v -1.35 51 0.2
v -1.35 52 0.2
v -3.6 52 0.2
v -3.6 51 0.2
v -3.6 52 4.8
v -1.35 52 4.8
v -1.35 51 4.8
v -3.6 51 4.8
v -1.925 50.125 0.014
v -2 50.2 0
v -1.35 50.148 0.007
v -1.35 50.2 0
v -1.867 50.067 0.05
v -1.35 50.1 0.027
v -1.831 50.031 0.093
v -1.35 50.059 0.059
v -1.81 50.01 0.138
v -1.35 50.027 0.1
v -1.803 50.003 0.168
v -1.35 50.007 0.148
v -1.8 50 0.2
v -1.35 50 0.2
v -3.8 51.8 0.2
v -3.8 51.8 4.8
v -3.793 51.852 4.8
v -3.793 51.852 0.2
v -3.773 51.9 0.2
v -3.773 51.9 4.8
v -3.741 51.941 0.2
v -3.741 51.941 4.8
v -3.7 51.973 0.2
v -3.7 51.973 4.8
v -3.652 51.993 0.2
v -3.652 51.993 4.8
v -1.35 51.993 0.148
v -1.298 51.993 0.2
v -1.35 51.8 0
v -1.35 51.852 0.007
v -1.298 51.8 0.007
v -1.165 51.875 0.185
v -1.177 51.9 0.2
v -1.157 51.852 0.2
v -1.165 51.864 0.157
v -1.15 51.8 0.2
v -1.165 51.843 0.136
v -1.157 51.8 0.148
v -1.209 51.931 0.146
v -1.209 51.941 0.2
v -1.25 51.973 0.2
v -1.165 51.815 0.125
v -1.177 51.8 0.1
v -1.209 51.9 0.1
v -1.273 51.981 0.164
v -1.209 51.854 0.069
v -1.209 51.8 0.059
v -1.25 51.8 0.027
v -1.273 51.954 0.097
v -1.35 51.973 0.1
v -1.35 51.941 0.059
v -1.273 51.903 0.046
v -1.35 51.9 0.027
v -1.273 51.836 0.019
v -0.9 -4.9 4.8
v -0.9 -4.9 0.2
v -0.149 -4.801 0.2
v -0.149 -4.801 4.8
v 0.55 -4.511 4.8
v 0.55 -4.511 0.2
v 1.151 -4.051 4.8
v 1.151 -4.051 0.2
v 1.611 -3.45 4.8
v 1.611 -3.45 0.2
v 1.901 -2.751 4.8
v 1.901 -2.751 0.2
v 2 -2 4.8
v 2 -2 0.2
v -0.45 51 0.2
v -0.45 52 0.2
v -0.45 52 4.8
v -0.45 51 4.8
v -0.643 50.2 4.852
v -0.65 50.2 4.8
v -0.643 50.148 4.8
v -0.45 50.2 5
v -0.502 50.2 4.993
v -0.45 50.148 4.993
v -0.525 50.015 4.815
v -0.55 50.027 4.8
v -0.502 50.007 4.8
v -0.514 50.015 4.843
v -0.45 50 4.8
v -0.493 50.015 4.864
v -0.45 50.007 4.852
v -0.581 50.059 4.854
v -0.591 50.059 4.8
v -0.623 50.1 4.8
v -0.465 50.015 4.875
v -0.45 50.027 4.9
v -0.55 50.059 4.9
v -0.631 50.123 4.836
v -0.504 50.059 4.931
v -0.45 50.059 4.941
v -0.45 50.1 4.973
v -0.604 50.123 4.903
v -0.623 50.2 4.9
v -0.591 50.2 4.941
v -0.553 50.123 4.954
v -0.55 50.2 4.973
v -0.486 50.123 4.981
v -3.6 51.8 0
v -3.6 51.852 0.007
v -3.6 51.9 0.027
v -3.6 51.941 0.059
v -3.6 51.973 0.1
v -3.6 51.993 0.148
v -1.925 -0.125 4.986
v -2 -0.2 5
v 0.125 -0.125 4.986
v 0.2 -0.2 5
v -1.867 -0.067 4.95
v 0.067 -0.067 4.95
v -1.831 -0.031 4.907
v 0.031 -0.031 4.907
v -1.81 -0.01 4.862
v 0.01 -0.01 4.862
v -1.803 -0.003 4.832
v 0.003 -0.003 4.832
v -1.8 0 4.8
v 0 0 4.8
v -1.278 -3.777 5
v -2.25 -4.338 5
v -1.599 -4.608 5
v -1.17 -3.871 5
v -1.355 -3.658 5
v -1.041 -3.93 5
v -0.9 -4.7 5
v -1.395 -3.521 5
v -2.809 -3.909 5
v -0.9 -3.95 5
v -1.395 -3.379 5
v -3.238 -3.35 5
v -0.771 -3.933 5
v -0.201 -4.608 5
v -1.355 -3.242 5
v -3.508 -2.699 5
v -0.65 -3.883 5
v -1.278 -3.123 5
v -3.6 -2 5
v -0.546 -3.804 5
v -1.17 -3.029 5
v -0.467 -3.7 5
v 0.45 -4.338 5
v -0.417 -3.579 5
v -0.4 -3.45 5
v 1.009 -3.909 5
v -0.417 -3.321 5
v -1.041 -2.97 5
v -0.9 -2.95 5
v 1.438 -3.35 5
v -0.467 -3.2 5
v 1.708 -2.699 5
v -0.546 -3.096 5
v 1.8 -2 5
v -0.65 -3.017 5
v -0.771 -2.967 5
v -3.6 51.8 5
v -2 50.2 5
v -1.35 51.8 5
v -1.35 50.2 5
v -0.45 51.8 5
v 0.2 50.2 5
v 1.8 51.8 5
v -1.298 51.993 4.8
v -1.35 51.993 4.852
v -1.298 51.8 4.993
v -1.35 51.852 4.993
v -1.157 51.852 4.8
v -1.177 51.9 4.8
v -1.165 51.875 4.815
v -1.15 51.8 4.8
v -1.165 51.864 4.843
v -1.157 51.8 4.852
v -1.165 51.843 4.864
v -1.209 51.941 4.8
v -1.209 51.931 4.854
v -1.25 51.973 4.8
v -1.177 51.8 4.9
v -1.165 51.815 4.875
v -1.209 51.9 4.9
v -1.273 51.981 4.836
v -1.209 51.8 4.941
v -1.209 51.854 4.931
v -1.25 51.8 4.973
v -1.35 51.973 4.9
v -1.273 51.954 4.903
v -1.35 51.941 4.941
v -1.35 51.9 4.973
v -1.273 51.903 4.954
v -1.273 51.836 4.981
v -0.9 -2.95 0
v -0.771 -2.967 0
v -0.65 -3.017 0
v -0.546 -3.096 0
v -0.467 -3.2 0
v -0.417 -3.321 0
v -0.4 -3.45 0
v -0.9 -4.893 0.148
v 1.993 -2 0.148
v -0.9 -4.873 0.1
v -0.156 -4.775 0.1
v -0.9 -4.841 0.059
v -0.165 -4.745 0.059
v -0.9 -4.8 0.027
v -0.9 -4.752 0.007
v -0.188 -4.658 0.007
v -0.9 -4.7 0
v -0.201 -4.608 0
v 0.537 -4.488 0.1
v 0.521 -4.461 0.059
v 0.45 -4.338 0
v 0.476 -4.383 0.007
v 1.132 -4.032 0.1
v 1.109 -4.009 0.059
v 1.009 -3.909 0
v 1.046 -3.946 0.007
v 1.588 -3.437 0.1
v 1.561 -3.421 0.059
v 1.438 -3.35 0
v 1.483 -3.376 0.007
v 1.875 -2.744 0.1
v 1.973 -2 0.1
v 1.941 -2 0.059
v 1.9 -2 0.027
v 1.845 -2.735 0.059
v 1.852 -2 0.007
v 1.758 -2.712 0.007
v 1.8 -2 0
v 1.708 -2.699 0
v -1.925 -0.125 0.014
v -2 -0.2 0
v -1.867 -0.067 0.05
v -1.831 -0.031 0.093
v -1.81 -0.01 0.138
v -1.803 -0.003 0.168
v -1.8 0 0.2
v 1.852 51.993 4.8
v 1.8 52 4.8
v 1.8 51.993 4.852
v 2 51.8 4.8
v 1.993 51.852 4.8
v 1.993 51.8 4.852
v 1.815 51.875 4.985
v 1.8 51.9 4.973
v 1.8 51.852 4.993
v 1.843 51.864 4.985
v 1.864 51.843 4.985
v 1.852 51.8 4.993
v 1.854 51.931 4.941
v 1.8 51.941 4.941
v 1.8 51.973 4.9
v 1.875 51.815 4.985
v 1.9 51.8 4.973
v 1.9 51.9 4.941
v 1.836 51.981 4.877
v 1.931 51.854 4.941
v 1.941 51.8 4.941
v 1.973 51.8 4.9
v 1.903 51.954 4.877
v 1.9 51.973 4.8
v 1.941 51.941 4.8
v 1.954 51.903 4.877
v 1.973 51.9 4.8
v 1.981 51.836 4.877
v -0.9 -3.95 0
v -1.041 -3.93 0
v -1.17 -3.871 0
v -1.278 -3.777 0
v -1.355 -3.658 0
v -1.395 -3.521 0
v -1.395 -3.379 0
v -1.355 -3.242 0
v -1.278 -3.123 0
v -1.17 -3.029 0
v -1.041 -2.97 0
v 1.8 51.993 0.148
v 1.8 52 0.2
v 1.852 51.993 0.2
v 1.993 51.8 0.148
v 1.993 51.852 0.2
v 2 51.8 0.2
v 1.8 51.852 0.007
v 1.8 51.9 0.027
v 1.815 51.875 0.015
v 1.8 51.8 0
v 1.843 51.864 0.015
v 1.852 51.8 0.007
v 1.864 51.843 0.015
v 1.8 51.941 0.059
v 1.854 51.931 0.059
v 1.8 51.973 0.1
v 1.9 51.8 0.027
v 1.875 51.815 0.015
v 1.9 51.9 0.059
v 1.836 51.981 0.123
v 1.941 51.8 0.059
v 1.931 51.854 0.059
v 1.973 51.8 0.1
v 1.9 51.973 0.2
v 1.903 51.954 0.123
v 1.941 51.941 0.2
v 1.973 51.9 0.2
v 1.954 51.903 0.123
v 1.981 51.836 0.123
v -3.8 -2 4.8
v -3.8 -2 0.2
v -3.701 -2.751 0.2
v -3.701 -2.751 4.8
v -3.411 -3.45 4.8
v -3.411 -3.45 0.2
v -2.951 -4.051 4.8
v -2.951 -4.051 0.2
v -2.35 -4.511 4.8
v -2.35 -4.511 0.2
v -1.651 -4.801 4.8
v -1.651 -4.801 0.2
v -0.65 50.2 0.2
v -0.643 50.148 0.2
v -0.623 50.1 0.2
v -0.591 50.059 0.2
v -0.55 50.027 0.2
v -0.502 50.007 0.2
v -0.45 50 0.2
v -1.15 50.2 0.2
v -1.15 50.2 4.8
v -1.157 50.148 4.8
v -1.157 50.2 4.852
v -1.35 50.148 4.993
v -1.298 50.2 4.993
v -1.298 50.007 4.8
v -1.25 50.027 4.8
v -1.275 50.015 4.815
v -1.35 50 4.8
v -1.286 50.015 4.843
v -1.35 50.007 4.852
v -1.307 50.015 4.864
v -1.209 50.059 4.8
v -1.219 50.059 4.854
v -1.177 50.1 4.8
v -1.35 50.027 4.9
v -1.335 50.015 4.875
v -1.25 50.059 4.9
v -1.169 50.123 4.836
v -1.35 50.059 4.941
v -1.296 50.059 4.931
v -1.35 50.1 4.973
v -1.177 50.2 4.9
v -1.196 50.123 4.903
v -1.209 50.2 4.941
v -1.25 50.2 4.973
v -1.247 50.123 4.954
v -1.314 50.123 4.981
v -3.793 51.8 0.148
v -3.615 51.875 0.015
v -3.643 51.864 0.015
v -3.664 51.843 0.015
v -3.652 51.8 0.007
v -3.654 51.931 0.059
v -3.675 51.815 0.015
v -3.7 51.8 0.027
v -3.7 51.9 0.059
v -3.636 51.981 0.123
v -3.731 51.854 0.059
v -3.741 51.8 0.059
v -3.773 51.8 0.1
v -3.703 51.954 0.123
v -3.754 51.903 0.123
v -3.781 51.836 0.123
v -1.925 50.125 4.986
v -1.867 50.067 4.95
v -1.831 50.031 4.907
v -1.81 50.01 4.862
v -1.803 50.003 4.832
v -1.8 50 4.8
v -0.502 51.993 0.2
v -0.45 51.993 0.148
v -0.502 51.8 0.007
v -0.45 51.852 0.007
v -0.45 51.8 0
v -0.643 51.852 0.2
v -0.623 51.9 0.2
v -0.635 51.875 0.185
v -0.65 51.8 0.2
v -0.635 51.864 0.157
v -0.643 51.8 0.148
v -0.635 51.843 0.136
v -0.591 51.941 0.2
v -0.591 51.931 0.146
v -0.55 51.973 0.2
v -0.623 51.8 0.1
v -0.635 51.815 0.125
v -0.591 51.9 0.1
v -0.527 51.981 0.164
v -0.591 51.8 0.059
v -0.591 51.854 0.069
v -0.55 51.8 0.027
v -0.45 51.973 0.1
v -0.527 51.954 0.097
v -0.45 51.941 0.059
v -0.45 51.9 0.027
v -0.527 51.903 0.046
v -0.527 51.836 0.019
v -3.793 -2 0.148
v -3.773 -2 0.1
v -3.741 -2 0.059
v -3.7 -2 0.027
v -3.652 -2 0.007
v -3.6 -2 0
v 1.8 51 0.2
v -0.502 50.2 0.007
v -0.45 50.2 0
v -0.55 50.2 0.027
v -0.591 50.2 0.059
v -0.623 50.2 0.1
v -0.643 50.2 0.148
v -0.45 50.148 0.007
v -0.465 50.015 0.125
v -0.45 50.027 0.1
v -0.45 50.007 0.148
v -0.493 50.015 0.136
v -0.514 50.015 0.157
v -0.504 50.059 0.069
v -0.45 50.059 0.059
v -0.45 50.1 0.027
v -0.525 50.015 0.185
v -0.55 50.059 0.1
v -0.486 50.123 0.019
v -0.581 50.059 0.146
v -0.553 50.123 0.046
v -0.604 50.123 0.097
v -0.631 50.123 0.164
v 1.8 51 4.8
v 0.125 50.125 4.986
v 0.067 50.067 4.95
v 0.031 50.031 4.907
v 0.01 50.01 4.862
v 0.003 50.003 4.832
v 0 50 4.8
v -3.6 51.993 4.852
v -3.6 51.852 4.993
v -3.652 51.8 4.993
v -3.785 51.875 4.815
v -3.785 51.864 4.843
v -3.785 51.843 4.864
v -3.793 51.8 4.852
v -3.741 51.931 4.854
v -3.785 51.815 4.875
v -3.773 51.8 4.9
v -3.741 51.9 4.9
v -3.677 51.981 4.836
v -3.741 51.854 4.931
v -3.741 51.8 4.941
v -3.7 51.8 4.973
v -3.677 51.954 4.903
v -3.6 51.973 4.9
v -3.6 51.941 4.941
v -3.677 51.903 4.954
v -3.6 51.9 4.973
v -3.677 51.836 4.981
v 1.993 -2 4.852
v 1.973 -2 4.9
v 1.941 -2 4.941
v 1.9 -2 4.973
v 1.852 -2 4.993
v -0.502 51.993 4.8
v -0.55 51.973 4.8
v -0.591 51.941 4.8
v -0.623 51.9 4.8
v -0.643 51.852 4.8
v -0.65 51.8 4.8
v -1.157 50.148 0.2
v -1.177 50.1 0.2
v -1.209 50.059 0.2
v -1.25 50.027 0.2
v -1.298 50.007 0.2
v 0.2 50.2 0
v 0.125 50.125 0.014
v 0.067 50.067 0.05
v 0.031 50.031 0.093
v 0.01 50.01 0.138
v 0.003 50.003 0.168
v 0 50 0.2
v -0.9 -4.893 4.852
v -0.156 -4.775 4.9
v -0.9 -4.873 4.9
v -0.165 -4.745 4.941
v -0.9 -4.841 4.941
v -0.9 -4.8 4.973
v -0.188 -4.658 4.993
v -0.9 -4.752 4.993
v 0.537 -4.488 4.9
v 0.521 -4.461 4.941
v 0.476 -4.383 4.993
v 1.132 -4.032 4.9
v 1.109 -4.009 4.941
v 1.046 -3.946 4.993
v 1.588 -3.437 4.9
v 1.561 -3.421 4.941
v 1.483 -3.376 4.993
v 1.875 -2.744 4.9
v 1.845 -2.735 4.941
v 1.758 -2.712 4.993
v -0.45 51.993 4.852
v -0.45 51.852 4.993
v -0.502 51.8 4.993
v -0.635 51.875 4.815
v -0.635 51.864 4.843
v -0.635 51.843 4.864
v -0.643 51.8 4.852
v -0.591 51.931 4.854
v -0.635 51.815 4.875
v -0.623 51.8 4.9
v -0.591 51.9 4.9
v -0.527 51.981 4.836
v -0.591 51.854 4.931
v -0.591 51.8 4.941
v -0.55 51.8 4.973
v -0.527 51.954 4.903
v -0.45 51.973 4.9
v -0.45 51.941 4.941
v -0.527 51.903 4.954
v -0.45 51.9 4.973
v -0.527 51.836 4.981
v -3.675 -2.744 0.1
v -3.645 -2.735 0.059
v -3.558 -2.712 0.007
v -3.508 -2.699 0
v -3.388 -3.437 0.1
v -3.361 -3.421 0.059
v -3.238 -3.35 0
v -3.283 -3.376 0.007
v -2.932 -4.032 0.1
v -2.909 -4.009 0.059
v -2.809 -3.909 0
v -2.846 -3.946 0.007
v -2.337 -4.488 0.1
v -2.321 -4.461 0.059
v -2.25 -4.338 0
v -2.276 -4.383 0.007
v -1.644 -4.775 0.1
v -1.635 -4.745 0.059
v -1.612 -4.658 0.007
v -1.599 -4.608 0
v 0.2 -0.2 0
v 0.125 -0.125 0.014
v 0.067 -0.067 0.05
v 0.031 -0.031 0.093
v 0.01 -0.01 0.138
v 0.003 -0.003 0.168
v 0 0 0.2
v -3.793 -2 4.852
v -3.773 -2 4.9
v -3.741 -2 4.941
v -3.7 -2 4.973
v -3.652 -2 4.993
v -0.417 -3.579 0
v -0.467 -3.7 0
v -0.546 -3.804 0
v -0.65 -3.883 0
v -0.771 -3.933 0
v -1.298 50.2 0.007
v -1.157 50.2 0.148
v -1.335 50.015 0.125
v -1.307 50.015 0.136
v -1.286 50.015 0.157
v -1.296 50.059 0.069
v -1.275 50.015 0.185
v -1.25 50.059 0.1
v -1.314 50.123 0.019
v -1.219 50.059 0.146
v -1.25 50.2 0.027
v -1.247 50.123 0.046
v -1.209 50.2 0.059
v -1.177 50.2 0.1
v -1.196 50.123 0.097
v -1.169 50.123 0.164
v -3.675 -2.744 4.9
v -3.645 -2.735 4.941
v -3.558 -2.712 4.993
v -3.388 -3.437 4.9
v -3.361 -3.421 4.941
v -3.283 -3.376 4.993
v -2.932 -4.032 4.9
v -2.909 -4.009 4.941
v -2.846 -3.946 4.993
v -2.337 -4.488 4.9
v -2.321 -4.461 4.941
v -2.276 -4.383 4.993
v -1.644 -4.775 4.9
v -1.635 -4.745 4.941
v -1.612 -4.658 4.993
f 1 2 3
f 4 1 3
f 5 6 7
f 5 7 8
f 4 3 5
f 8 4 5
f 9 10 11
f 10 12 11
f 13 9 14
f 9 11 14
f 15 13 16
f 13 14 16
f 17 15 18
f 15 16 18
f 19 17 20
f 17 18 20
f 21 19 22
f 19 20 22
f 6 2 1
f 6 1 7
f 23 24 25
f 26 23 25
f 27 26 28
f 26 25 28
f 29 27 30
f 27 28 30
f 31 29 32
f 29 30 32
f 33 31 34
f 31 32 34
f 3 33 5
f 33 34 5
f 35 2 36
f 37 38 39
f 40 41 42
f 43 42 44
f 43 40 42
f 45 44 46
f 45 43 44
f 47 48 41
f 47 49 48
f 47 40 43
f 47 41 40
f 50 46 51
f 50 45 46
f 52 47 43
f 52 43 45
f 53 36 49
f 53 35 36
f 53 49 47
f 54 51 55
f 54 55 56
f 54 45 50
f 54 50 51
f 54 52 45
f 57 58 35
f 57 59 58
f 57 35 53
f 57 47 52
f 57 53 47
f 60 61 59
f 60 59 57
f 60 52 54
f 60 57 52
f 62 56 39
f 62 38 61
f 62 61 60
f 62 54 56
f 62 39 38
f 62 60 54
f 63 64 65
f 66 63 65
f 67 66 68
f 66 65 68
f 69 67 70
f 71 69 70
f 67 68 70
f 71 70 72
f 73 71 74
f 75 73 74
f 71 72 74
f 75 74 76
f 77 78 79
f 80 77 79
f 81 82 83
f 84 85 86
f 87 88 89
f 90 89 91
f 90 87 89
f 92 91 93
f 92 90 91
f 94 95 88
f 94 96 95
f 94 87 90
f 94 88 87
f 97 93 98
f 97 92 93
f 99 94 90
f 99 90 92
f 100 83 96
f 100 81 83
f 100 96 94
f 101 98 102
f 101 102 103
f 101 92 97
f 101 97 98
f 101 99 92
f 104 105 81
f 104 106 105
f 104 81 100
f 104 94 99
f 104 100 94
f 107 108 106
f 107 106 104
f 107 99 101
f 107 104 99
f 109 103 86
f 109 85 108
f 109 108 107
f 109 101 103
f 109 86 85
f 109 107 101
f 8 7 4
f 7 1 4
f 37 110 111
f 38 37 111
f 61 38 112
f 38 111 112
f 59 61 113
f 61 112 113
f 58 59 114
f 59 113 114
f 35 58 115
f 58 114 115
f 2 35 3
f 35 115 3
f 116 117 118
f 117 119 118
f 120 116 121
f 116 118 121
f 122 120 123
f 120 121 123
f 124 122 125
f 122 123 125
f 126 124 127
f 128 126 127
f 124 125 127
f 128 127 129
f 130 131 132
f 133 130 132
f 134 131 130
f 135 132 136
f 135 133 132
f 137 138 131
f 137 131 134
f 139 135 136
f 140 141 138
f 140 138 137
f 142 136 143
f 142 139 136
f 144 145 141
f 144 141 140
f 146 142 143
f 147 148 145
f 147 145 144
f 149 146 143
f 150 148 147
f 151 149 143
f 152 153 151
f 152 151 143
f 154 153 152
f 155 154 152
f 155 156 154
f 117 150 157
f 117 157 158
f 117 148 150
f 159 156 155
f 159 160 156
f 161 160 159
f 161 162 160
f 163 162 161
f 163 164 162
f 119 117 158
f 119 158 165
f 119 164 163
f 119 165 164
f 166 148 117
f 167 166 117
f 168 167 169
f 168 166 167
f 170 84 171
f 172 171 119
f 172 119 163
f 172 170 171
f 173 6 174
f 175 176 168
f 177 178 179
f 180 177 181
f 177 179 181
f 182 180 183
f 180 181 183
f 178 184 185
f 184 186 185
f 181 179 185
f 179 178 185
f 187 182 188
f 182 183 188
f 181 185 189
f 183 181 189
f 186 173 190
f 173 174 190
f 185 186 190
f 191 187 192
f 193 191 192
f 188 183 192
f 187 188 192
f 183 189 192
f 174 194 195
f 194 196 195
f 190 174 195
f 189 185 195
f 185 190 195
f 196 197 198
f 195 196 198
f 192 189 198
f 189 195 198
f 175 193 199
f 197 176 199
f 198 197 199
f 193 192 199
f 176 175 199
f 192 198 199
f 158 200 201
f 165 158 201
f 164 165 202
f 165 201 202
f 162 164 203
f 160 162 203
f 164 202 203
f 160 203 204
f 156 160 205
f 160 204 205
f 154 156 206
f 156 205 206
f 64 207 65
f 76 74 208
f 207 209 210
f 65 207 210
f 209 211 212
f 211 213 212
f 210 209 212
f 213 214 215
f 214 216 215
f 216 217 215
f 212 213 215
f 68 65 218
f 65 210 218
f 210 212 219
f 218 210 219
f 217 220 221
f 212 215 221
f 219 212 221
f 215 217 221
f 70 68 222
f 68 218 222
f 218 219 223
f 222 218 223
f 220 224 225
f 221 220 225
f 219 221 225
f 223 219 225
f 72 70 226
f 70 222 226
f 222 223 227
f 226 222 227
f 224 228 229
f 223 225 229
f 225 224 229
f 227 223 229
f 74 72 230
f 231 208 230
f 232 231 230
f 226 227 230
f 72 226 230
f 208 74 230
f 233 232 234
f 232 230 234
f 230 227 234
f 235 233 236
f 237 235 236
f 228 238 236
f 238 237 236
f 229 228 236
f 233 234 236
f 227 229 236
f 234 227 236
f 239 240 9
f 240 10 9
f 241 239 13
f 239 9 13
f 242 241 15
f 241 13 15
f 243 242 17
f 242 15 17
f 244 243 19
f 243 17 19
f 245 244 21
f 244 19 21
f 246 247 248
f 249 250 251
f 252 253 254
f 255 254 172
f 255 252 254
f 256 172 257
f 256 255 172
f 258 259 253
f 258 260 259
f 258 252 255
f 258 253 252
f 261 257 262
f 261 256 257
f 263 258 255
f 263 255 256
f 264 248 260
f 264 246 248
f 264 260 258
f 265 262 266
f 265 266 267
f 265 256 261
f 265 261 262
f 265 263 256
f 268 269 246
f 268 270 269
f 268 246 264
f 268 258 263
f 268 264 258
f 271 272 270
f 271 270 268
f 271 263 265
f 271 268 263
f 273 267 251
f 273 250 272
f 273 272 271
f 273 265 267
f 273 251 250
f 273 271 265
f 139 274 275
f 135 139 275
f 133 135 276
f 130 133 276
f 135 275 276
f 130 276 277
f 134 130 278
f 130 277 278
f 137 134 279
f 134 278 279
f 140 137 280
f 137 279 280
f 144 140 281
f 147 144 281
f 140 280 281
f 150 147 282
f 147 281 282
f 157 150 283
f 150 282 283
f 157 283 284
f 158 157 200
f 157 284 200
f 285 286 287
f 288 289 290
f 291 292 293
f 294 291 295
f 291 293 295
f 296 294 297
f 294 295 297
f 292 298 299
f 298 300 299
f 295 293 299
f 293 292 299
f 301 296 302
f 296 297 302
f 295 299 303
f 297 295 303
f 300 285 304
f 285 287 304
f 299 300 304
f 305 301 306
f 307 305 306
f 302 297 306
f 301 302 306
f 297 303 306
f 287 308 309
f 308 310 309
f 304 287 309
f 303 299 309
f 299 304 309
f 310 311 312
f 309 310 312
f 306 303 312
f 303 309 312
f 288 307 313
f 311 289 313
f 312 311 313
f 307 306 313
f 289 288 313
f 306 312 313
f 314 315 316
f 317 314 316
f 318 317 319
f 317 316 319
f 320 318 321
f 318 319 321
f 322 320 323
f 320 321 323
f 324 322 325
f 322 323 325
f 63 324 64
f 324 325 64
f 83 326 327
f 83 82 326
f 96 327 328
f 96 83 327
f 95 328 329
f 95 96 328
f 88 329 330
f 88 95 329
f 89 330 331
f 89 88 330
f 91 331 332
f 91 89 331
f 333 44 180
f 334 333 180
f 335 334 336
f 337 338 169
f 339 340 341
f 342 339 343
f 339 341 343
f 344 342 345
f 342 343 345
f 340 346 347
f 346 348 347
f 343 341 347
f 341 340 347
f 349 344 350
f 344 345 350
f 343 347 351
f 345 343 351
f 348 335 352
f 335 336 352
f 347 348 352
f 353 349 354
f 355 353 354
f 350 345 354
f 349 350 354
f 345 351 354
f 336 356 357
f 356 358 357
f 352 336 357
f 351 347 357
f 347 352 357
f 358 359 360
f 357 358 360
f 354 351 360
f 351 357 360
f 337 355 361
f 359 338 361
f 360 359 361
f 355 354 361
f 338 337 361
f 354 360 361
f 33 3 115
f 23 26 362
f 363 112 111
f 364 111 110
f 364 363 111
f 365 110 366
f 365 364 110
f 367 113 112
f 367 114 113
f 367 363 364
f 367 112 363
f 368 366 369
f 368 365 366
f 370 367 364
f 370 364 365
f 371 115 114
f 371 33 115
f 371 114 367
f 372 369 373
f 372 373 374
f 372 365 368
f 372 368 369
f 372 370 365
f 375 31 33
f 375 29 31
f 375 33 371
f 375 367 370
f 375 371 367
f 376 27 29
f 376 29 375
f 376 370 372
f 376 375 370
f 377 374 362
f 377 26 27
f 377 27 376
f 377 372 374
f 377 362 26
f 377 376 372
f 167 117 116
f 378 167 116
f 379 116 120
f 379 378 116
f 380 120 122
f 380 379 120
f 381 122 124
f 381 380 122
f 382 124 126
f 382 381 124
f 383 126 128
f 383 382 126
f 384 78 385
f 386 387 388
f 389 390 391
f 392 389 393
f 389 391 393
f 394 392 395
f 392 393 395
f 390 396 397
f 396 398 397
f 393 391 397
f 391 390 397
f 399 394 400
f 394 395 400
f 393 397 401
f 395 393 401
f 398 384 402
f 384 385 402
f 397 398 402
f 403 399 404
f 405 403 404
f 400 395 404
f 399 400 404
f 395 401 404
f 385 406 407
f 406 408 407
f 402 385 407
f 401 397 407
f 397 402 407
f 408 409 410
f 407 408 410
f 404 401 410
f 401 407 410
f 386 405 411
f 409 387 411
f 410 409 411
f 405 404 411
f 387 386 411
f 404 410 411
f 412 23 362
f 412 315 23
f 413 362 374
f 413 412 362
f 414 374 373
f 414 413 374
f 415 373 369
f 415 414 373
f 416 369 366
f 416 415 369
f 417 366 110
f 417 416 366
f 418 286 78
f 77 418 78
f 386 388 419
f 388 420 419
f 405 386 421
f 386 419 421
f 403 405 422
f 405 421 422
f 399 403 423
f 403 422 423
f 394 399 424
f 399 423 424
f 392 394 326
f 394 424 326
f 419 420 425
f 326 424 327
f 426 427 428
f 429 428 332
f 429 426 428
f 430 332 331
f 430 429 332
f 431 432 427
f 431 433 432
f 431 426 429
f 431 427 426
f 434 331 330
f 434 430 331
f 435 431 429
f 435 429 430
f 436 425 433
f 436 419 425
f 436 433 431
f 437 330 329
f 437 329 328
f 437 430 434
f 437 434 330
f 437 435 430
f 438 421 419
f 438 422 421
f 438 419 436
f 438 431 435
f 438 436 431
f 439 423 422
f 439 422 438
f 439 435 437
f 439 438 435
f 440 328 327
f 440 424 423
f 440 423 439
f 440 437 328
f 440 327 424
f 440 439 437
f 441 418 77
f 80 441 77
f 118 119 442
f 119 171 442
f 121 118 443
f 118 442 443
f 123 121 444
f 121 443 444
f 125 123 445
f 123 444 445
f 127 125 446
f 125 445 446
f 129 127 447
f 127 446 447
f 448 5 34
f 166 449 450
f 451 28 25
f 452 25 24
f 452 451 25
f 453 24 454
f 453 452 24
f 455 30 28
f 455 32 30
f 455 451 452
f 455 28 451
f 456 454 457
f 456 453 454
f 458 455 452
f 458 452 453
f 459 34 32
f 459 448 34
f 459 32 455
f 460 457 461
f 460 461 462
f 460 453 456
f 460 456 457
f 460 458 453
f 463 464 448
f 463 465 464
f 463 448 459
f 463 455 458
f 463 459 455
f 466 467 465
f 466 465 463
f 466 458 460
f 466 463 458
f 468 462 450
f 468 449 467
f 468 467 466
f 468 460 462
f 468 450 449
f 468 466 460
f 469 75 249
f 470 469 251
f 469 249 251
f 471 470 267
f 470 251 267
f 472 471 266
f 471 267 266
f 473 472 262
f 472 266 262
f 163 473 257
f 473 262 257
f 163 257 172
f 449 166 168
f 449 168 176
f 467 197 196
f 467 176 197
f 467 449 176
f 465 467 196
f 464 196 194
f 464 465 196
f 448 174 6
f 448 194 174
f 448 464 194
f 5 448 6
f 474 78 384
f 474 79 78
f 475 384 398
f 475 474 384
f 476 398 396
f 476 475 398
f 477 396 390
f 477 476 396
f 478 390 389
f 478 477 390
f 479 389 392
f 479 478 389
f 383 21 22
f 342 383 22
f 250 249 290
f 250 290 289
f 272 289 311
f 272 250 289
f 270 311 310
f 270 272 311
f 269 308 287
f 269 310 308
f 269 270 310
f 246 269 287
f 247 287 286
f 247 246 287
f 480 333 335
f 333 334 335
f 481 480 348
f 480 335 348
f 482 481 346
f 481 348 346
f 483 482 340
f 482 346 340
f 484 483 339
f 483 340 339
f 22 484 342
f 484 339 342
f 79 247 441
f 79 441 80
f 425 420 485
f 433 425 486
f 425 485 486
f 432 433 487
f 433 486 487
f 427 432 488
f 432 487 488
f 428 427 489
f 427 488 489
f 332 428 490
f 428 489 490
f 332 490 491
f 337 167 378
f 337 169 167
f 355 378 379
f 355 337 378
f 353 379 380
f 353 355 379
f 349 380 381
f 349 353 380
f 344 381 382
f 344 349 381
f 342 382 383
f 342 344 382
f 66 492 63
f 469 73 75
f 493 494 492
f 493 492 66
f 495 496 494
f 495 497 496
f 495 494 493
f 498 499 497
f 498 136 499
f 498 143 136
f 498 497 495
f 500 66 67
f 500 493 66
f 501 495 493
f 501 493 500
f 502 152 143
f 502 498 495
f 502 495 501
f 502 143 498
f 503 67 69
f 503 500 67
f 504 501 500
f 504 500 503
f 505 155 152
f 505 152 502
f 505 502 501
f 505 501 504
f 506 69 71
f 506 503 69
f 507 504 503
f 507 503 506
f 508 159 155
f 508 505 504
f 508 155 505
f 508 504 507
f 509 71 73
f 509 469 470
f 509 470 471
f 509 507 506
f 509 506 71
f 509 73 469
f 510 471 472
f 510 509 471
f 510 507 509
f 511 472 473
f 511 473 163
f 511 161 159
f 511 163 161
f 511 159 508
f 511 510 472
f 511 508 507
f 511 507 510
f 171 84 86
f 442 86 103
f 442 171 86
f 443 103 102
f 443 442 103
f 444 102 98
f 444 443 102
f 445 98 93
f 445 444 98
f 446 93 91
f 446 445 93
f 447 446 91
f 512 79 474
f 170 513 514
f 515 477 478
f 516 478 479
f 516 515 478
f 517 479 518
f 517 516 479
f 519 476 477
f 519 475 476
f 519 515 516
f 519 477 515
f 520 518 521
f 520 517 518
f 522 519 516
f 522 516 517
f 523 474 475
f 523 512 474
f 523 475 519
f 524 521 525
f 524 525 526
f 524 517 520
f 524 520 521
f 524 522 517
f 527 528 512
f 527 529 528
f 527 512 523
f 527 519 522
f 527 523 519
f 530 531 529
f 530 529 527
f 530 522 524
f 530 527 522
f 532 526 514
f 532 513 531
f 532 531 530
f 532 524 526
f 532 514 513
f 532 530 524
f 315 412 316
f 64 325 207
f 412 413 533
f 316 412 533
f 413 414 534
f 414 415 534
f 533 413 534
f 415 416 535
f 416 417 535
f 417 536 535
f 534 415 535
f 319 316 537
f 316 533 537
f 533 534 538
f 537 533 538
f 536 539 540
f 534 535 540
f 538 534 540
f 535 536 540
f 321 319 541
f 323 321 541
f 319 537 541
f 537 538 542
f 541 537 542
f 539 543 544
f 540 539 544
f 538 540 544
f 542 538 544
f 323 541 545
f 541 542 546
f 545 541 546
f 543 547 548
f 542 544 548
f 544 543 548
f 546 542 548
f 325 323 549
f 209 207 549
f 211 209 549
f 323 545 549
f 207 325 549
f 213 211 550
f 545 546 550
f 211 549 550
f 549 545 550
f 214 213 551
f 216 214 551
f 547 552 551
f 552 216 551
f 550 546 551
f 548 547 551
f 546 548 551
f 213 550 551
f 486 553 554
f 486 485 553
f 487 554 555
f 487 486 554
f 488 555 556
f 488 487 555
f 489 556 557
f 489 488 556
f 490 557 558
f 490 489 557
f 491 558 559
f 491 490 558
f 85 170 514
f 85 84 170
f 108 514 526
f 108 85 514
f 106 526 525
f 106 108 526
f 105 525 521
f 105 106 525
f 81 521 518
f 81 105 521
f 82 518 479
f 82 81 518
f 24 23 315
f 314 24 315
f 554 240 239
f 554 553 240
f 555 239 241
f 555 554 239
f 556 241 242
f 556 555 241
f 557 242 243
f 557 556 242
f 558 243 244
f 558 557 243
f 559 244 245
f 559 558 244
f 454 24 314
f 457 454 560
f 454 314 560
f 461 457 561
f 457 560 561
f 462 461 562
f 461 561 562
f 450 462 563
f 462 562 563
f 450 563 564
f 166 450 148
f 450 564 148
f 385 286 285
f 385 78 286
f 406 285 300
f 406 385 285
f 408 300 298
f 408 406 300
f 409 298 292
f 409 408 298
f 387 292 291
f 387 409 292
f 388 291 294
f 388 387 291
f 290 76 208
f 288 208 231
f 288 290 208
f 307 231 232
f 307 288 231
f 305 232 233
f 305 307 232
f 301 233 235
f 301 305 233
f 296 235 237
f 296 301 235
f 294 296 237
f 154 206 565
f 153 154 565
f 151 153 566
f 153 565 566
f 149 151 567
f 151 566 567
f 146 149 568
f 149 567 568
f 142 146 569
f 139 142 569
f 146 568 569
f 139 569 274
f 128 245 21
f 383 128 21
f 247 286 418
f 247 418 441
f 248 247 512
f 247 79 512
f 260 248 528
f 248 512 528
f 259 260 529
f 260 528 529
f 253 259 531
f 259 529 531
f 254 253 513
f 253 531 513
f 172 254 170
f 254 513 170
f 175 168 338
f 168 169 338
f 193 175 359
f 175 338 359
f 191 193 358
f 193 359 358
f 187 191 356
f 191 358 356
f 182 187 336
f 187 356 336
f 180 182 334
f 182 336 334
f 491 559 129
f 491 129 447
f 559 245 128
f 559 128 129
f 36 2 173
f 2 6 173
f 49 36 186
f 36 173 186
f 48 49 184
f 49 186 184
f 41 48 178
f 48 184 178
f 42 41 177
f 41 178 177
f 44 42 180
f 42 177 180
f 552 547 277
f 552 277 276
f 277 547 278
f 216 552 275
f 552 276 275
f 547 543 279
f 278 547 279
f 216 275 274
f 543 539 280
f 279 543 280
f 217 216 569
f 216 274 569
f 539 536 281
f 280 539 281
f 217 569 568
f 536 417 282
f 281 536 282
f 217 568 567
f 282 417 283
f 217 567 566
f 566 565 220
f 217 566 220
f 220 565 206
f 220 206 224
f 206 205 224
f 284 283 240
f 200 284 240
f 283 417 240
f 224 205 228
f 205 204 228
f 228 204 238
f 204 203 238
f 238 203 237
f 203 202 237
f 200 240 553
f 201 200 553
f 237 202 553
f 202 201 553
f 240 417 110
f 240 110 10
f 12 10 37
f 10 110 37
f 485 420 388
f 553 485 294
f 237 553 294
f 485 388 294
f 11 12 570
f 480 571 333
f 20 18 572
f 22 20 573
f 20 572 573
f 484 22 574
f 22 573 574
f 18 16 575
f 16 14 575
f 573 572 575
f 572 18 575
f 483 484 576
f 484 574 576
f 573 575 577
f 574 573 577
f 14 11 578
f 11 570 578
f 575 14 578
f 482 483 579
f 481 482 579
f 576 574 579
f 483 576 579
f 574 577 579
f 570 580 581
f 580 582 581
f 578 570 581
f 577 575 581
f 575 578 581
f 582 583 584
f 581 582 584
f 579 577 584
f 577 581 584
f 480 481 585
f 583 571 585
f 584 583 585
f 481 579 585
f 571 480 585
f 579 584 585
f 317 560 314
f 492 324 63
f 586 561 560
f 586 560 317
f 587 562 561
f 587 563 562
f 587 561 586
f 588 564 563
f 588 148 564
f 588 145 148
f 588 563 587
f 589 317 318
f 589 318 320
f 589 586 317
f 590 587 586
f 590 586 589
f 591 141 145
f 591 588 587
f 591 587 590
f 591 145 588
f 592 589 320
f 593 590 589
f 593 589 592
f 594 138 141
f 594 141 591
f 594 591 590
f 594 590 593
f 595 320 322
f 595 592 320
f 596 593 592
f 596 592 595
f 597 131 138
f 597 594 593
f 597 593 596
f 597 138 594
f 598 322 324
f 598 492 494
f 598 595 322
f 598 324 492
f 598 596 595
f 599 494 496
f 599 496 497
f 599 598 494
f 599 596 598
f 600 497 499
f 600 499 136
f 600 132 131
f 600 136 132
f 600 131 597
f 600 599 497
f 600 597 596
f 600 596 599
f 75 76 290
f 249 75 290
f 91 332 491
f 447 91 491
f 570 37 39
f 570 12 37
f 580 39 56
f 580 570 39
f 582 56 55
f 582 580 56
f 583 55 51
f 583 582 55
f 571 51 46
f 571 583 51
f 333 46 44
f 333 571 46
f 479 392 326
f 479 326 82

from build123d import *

# Parameters (mm, degrees)
F0_W     = 1.8
F0_H     = 50
F1_DEPTH = 5
F2_W     = 0.5
F2_H     = 5
F3_DEPTH = 2
F4_R     = 0.2
F5_DEPTH = 1


with BuildPart() as f1:
    # F0 (on Top) → F1 (new body)
    with BuildSketch(Plane.XY):
        Polygon((2, -2), (2, 52), (-3.8, 52), (-3.8, -2), (-0.9, -2), align=None)
        with Locations((-0.9, 25)):
            Rectangle(F0_W, F0_H, mode=Mode.SUBTRACT)
        with BuildLine():
            ThreePointArc((-0.9, -4.9), (1.1506096654, -4.0506096654), (2, -2))
            Line((2, -2), (-0.9, -2))
            Line((-0.9, -2), (-0.9, -2.95))
            ThreePointArc((-0.9, -2.95), (-0.5464466094, -3.0964466094), (-0.4, -3.45))
            ThreePointArc((-0.4, -3.45), (-0.5464466094, -3.8035533906), (-0.9, -3.95))
            Line((-0.9, -3.95), (-0.9, -4.9))
        make_face()
        with BuildLine():
            Line((-0.9, -2.95), (-0.9, -2))
            Line((-0.9, -2), (-3.8, -2))
            ThreePointArc((-3.8, -2), (-2.9506096654, -4.0506096654), (-0.9, -4.9))
            Line((-0.9, -4.9), (-0.9, -3.95))
            ThreePointArc((-0.9, -3.95), (-1.4, -3.45), (-0.9, -2.95))
        make_face()
    extrude(amount=F1_DEPTH)

    # F2 (on face) → F3 (cut)
    with BuildSketch(Plane(origin=(0, 52, 0), x_dir=(-1, 0, 0), z_dir=(0, 1, 0))):
        with Locations((0.9, 2.5)):
            Rectangle(F2_W, F2_H)
    extrude(amount=-F3_DEPTH, mode=Mode.SUBTRACT)

    # F4
    f4_edges = [f1.edges().sort_by_distance(p)[0] for p in [
        (2, 52, 2.5),
        (0.675, 52, 0),
        (0.675, 52, 5),
        (-2.475, 52, 5),
        (-3.8, 52, 2.5),
        (-2.475, 52, 0),
        (-0.65, 52, 2.5),
        (-1.15, 52, 2.5),
        (-1.15, 51, 5),
        (-0.65, 51, 5),
        (-0.65, 51, 0),
        (-1.15, 51, 0),
        (-1.475, 50, 0),
        (-1.15, 50, 2.5),
        (-0.325, 50, 0),
        (-0.65, 50, 2.5),
        (-1.475, 50, 5),
        (-0.325, 50, 5),
        (2, 25, 5),
        (2, 25, 0),
        (-1.8, 25, 5),
        (-1.8, 25, 0),
        (0, 25, 5),
        (0, 25, 0),
        (-0.9, 0, 0),
        (-0.9, 0, 5),
    ]]
    fillet(f4_edges, radius=F4_R)

    # F5 (cut): faces of the model
    f5_faces = [f1.faces().sort_by_distance(p)[0] for p in [
        (-2.475, 52, 2.5),
        (0.675, 52, 2.5),
    ]]
    extrude(f5_faces, amount=-F5_DEPTH, mode=Mode.SUBTRACT)


solid = f1.part
